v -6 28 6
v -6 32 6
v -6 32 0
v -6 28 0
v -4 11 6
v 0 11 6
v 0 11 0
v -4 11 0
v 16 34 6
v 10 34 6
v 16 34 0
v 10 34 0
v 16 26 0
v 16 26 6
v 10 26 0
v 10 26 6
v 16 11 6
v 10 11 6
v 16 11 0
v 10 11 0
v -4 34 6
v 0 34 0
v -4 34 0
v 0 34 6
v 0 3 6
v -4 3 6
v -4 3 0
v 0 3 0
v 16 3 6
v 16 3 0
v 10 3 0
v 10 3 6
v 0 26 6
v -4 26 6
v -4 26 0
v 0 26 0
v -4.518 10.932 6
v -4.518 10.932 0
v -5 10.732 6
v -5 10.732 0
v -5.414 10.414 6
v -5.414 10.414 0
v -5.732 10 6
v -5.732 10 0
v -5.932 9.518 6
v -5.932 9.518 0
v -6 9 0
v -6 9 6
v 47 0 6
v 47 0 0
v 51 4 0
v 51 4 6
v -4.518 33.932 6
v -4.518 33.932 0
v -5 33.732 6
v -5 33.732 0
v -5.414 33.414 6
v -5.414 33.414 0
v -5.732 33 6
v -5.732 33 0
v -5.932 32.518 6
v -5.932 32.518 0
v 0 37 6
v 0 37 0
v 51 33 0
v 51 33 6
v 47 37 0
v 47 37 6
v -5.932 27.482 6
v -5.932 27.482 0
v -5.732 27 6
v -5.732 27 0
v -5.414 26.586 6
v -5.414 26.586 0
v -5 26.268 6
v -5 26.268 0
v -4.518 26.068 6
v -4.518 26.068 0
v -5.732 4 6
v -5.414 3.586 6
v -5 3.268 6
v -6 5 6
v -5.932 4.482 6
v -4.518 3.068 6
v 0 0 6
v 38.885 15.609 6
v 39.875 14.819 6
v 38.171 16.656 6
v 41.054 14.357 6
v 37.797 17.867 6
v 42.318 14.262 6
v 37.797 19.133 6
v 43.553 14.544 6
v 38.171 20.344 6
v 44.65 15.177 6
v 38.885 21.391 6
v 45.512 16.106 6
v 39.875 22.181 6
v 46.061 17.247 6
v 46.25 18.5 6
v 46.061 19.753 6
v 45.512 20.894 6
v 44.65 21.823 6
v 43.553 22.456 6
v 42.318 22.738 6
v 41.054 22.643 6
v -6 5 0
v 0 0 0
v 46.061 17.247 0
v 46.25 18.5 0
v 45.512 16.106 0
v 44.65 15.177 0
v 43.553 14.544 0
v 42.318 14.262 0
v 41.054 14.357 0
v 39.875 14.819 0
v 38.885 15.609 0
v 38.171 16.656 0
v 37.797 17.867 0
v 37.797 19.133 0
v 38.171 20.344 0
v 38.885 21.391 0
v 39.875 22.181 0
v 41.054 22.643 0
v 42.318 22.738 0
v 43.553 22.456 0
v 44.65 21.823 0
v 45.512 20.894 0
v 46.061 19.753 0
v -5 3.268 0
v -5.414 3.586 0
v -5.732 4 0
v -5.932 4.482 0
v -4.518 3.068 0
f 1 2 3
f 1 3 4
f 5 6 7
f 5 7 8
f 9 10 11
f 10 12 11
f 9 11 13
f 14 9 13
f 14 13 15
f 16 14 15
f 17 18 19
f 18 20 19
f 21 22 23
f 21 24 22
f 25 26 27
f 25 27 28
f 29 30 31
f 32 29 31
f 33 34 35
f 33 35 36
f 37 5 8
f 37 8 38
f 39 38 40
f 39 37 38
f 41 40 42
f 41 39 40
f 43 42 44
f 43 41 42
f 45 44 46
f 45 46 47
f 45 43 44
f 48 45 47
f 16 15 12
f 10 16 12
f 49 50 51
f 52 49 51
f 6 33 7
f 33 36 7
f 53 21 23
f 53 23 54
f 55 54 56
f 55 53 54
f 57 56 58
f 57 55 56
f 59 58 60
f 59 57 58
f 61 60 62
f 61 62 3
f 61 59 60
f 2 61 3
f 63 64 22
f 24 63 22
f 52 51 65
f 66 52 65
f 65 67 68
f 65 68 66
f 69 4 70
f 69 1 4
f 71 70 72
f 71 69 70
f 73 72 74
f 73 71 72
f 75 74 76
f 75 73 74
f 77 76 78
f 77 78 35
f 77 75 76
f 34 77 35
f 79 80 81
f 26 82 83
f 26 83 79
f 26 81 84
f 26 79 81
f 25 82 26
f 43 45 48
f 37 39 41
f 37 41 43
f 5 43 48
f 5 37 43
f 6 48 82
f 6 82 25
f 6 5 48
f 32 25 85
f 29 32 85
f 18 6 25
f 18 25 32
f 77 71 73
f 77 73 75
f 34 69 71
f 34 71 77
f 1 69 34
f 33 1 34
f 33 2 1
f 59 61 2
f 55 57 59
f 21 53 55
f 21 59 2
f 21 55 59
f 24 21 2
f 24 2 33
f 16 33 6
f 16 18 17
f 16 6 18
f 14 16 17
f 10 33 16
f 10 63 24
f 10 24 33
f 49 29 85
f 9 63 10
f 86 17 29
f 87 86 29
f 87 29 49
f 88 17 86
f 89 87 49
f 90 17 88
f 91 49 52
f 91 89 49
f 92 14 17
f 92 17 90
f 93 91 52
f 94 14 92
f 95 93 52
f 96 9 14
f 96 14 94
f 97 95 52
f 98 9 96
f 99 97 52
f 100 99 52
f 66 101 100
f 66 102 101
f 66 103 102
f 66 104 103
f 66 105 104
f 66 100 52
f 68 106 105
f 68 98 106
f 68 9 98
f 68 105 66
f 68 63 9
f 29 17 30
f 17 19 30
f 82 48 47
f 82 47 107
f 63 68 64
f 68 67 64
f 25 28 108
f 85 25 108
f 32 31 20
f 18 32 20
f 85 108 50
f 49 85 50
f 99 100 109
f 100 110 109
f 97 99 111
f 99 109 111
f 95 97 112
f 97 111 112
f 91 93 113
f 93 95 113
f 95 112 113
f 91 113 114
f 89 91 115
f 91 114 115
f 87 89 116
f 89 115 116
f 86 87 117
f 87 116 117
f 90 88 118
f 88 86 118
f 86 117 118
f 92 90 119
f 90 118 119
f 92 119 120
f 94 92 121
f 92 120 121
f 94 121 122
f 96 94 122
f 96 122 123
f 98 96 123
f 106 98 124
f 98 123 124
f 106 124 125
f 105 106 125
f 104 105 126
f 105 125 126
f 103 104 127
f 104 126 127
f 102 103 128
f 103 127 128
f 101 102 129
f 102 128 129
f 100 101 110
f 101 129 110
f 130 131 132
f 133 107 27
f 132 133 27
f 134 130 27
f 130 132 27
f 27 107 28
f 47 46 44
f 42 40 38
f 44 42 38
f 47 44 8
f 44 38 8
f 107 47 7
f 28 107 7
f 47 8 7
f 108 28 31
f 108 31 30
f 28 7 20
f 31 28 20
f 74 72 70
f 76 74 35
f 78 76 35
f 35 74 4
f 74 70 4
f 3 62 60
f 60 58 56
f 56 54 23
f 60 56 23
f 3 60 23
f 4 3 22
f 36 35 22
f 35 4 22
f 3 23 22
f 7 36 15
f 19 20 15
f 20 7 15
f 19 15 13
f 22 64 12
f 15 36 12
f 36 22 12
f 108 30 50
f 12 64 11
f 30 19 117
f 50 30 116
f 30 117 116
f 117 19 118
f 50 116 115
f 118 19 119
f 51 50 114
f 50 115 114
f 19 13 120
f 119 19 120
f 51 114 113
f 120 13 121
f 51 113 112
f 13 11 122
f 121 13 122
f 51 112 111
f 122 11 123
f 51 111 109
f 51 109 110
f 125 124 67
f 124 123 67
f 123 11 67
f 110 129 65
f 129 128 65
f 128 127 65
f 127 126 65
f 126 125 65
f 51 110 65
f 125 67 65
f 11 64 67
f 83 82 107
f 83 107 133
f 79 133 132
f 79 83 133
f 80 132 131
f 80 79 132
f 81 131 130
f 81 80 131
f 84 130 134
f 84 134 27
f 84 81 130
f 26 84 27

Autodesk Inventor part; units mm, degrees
ref_plane "YZ Plane" through (0, 0, 0) normal (1, 0, 0) x (0, 1, 0)
ref_plane "XZ Plane" through (0, 0, 0) normal (0, 1, 0) x (-1, 0, 0)
ref_plane "XY Plane" through (0, 0, 0) normal (0, 0, 1) x (1, 0, 0)
sketch "Sketch1" plane through (0, 0, 0) normal (0, 0, 1) x (1, 0, 0)
  line L0 (0, 0) -> (47, 0)
  line L1 (51, 4) -> (51, 33)
  line L2 (47, 37) -> (0, 37)
  line L3 (0, 37) -> (0, 0)
  circle A0 centre (42, 18.5) radius 4.25
  line L4 (47, 37) -> (51, 33)
  line L5 (47, 0) -> (51, 4)
  line L6 (10, 34) -> (16, 34)
  line L7 (16, 34) -> (16, 26)
  line L8 (16, 26) -> (10, 26)
  line L9 (10, 26) -> (10, 34)
  line L10 (10, 11) -> (16, 11)
  line L11 (16, 11) -> (16, 3)
  line L12 (16, 3) -> (10, 3)
  line L13 (10, 3) -> (10, 11)
  line L14 (10, 26) -> (16, 11) construction
  line L15 (10, 11) -> (16, 26) construction
  circle A1 centre (42, 18.5) radius 16 construction
  line L16 (24, 37) -> (24, 0) construction
  point P0 (51, 37)
  point P1 (51, 0)
  point P2 (0, 18.5)
  point P3 (13, 18.5)
  dimension "d0" = 4
  dimension "d1" = 4
  dimension "d2" = 4
  dimension "d3" = 4
  dimension "d4" = 8.5
  dimension "d5" = 37
  dimension "d6" = 6
  dimension "d7" = 8
  dimension "d8" = 8
  dimension "d9" = 15
  dimension "d10" = 10
  dimension "d11" = 32
  dimension "d12" = 9
  dimension "d13" = 26
  dimension "d14" = 24
extrude "Extrusion1" add sketch "Sketch1" along normal blind 6
sketch "Sketch2" plane through (0, 0, 6) normal (0, 0, 1) x (1, 0, 0)
  line L0 (16, 26) -> (10, 26) projected
  line L1 (0, 37) -> (0, 0) projected
  line L2 (0, 34) -> (-4, 34)
  line L3 (-6, 32) -> (-6, 28)
  line L4 (-4, 26) -> (0, 26)
  line L5 (0, 26) -> (0, 34)
  line L6 (0, 11) -> (-4, 11)
  line L7 (-6, 9) -> (-6, 5)
  line L8 (-4, 3) -> (0, 3)
  line L9 (0, 3) -> (0, 11)
  arc A0 (-4, 34) -> (-6, 32) centre (-4, 32) ccw
  arc A1 (-6, 28) -> (-4, 26) centre (-4, 28) ccw
  arc A2 (-4, 11) -> (-6, 9) centre (-4, 9) ccw
  arc A3 (-6, 5) -> (-4, 3) centre (-4, 5) ccw
  dimension "d17" = 2
  dimension "d18" = 6
  dimension "d19" = 8
  dimension "d20" = 8
  dimension "d21" = 15
extrude "Extrusion2" add sketch "Sketch2" against normal blind 6
equation "\"d1\" = d0"
equation "\"d2\" = d0"
equation "\"d3\" = d2"
properties part number "y_carriage_belt_iddler"
